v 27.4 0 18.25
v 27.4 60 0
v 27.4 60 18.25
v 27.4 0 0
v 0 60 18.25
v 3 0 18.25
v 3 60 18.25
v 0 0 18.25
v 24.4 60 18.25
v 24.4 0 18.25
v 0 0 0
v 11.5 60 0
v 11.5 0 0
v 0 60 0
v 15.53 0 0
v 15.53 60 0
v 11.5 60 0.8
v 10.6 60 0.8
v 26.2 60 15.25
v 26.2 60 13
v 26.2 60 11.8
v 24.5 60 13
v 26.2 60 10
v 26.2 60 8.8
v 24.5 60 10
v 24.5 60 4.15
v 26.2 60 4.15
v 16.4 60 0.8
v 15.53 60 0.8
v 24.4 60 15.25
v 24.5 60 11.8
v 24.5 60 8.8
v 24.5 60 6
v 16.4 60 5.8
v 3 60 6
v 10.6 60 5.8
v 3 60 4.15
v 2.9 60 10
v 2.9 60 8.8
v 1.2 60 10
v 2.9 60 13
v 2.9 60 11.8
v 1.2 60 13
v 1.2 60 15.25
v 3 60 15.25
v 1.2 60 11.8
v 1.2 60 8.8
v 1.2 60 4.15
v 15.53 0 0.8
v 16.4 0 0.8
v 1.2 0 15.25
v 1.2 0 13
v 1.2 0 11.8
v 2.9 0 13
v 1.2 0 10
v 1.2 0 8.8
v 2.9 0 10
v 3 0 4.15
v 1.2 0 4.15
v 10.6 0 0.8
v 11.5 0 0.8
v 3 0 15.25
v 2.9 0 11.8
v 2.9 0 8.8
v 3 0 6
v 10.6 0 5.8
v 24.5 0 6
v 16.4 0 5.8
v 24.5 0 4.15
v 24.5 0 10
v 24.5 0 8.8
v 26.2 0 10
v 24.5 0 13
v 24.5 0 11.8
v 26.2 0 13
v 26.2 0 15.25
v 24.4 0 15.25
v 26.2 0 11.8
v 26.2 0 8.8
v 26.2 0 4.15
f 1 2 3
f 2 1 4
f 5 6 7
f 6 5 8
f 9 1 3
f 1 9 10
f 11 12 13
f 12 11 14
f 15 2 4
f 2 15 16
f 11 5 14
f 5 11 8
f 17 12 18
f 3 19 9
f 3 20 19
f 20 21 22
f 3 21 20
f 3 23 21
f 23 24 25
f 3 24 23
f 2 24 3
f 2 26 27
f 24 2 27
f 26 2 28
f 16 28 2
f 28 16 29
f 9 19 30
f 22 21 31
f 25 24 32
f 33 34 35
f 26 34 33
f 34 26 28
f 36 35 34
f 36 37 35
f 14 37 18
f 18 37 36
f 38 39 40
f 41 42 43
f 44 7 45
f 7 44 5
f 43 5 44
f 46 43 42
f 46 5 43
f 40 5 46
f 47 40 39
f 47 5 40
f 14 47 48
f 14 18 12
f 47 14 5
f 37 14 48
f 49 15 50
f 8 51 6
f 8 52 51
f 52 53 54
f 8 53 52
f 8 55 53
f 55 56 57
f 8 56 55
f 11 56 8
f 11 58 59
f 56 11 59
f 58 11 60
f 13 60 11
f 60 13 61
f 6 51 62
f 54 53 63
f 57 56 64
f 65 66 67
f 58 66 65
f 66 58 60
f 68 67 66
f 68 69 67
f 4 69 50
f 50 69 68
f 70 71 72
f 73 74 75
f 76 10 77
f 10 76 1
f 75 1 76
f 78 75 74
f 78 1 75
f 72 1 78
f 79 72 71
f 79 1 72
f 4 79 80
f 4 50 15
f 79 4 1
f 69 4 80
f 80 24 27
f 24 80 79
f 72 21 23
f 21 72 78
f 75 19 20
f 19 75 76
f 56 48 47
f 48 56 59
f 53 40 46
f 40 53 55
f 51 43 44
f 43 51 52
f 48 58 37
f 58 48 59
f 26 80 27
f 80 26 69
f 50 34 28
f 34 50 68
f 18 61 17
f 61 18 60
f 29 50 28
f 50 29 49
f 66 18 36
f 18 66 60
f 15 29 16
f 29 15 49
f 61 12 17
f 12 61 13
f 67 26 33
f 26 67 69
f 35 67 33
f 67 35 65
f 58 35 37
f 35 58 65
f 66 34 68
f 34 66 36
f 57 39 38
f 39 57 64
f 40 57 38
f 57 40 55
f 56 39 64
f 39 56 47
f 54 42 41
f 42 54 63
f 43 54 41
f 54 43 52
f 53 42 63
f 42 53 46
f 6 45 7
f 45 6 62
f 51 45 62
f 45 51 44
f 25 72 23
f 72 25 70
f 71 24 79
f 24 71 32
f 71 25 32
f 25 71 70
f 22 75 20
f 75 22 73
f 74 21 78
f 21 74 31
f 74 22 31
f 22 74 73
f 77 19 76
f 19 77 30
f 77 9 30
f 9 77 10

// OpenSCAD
outerWallThickness=1.2;
aluminumXThickness=27.4;
aluminumZHeight=18.25;
topLipZ=3;
topLipX=3;
innerRailX=2.9;
innerRailZ=1.2;

railLength=60;


union(){
	difference(){
		cube([aluminumXThickness,railLength,aluminumZHeight]);

		//Full Channel Gap
		translate([outerWallThickness,-1,6]) cube([25,railLength+10,20]);
		
		//Bottom Gap
		translate([outerWallThickness,-1,4.15]) cube([25,railLength+10,5]);	
		
		//Middle Gap
		translate([outerWallThickness,-1,10.15]) cube([25,railLength+10,2]);	
		
		//Bottom Guide
		translate([10.6,-1,0.8]) cube([5.8,railLength+10,5]);
		translate([11.5,-1,-1]) cube([4.03,railLength+10,5]);
		
	};

	//Bottom Rails
	difference(){
		translate([3,0,0]) cube([21.5,railLength,6]);
		//Bottom Guide
		translate([10.6,-1,0.8]) cube([5.8,railLength+10,5]);
		translate([11.5,-1,-1]) cube([4.03,railLength+10,5]);
	};

	//Left Rails
	//Bottom
	translate([0,0,10-innerRailZ]) cube([innerRailX,railLength,innerRailZ]);

	//Middle
	translate([0,0,13-innerRailZ]) cube([innerRailX,railLength,innerRailZ]);

	//Top
	translate([0,0,aluminumZHeight-topLipZ]) cube([topLipX,railLength,topLipZ]);

	//Right Rails
	//Bottom
	translate([aluminumXThickness-innerRailX,0,10-innerRailZ]) cube([innerRailX,railLength,innerRailZ]);

	//Middle
	translate([aluminumXThickness-innerRailX,0,13-innerRailZ]) cube([innerRailX,railLength,innerRailZ]);

	//Top
	translate([aluminumXThickness-topLipX,0,aluminumZHeight-topLipZ]) cube([topLipX,railLength,topLipZ]);
};
